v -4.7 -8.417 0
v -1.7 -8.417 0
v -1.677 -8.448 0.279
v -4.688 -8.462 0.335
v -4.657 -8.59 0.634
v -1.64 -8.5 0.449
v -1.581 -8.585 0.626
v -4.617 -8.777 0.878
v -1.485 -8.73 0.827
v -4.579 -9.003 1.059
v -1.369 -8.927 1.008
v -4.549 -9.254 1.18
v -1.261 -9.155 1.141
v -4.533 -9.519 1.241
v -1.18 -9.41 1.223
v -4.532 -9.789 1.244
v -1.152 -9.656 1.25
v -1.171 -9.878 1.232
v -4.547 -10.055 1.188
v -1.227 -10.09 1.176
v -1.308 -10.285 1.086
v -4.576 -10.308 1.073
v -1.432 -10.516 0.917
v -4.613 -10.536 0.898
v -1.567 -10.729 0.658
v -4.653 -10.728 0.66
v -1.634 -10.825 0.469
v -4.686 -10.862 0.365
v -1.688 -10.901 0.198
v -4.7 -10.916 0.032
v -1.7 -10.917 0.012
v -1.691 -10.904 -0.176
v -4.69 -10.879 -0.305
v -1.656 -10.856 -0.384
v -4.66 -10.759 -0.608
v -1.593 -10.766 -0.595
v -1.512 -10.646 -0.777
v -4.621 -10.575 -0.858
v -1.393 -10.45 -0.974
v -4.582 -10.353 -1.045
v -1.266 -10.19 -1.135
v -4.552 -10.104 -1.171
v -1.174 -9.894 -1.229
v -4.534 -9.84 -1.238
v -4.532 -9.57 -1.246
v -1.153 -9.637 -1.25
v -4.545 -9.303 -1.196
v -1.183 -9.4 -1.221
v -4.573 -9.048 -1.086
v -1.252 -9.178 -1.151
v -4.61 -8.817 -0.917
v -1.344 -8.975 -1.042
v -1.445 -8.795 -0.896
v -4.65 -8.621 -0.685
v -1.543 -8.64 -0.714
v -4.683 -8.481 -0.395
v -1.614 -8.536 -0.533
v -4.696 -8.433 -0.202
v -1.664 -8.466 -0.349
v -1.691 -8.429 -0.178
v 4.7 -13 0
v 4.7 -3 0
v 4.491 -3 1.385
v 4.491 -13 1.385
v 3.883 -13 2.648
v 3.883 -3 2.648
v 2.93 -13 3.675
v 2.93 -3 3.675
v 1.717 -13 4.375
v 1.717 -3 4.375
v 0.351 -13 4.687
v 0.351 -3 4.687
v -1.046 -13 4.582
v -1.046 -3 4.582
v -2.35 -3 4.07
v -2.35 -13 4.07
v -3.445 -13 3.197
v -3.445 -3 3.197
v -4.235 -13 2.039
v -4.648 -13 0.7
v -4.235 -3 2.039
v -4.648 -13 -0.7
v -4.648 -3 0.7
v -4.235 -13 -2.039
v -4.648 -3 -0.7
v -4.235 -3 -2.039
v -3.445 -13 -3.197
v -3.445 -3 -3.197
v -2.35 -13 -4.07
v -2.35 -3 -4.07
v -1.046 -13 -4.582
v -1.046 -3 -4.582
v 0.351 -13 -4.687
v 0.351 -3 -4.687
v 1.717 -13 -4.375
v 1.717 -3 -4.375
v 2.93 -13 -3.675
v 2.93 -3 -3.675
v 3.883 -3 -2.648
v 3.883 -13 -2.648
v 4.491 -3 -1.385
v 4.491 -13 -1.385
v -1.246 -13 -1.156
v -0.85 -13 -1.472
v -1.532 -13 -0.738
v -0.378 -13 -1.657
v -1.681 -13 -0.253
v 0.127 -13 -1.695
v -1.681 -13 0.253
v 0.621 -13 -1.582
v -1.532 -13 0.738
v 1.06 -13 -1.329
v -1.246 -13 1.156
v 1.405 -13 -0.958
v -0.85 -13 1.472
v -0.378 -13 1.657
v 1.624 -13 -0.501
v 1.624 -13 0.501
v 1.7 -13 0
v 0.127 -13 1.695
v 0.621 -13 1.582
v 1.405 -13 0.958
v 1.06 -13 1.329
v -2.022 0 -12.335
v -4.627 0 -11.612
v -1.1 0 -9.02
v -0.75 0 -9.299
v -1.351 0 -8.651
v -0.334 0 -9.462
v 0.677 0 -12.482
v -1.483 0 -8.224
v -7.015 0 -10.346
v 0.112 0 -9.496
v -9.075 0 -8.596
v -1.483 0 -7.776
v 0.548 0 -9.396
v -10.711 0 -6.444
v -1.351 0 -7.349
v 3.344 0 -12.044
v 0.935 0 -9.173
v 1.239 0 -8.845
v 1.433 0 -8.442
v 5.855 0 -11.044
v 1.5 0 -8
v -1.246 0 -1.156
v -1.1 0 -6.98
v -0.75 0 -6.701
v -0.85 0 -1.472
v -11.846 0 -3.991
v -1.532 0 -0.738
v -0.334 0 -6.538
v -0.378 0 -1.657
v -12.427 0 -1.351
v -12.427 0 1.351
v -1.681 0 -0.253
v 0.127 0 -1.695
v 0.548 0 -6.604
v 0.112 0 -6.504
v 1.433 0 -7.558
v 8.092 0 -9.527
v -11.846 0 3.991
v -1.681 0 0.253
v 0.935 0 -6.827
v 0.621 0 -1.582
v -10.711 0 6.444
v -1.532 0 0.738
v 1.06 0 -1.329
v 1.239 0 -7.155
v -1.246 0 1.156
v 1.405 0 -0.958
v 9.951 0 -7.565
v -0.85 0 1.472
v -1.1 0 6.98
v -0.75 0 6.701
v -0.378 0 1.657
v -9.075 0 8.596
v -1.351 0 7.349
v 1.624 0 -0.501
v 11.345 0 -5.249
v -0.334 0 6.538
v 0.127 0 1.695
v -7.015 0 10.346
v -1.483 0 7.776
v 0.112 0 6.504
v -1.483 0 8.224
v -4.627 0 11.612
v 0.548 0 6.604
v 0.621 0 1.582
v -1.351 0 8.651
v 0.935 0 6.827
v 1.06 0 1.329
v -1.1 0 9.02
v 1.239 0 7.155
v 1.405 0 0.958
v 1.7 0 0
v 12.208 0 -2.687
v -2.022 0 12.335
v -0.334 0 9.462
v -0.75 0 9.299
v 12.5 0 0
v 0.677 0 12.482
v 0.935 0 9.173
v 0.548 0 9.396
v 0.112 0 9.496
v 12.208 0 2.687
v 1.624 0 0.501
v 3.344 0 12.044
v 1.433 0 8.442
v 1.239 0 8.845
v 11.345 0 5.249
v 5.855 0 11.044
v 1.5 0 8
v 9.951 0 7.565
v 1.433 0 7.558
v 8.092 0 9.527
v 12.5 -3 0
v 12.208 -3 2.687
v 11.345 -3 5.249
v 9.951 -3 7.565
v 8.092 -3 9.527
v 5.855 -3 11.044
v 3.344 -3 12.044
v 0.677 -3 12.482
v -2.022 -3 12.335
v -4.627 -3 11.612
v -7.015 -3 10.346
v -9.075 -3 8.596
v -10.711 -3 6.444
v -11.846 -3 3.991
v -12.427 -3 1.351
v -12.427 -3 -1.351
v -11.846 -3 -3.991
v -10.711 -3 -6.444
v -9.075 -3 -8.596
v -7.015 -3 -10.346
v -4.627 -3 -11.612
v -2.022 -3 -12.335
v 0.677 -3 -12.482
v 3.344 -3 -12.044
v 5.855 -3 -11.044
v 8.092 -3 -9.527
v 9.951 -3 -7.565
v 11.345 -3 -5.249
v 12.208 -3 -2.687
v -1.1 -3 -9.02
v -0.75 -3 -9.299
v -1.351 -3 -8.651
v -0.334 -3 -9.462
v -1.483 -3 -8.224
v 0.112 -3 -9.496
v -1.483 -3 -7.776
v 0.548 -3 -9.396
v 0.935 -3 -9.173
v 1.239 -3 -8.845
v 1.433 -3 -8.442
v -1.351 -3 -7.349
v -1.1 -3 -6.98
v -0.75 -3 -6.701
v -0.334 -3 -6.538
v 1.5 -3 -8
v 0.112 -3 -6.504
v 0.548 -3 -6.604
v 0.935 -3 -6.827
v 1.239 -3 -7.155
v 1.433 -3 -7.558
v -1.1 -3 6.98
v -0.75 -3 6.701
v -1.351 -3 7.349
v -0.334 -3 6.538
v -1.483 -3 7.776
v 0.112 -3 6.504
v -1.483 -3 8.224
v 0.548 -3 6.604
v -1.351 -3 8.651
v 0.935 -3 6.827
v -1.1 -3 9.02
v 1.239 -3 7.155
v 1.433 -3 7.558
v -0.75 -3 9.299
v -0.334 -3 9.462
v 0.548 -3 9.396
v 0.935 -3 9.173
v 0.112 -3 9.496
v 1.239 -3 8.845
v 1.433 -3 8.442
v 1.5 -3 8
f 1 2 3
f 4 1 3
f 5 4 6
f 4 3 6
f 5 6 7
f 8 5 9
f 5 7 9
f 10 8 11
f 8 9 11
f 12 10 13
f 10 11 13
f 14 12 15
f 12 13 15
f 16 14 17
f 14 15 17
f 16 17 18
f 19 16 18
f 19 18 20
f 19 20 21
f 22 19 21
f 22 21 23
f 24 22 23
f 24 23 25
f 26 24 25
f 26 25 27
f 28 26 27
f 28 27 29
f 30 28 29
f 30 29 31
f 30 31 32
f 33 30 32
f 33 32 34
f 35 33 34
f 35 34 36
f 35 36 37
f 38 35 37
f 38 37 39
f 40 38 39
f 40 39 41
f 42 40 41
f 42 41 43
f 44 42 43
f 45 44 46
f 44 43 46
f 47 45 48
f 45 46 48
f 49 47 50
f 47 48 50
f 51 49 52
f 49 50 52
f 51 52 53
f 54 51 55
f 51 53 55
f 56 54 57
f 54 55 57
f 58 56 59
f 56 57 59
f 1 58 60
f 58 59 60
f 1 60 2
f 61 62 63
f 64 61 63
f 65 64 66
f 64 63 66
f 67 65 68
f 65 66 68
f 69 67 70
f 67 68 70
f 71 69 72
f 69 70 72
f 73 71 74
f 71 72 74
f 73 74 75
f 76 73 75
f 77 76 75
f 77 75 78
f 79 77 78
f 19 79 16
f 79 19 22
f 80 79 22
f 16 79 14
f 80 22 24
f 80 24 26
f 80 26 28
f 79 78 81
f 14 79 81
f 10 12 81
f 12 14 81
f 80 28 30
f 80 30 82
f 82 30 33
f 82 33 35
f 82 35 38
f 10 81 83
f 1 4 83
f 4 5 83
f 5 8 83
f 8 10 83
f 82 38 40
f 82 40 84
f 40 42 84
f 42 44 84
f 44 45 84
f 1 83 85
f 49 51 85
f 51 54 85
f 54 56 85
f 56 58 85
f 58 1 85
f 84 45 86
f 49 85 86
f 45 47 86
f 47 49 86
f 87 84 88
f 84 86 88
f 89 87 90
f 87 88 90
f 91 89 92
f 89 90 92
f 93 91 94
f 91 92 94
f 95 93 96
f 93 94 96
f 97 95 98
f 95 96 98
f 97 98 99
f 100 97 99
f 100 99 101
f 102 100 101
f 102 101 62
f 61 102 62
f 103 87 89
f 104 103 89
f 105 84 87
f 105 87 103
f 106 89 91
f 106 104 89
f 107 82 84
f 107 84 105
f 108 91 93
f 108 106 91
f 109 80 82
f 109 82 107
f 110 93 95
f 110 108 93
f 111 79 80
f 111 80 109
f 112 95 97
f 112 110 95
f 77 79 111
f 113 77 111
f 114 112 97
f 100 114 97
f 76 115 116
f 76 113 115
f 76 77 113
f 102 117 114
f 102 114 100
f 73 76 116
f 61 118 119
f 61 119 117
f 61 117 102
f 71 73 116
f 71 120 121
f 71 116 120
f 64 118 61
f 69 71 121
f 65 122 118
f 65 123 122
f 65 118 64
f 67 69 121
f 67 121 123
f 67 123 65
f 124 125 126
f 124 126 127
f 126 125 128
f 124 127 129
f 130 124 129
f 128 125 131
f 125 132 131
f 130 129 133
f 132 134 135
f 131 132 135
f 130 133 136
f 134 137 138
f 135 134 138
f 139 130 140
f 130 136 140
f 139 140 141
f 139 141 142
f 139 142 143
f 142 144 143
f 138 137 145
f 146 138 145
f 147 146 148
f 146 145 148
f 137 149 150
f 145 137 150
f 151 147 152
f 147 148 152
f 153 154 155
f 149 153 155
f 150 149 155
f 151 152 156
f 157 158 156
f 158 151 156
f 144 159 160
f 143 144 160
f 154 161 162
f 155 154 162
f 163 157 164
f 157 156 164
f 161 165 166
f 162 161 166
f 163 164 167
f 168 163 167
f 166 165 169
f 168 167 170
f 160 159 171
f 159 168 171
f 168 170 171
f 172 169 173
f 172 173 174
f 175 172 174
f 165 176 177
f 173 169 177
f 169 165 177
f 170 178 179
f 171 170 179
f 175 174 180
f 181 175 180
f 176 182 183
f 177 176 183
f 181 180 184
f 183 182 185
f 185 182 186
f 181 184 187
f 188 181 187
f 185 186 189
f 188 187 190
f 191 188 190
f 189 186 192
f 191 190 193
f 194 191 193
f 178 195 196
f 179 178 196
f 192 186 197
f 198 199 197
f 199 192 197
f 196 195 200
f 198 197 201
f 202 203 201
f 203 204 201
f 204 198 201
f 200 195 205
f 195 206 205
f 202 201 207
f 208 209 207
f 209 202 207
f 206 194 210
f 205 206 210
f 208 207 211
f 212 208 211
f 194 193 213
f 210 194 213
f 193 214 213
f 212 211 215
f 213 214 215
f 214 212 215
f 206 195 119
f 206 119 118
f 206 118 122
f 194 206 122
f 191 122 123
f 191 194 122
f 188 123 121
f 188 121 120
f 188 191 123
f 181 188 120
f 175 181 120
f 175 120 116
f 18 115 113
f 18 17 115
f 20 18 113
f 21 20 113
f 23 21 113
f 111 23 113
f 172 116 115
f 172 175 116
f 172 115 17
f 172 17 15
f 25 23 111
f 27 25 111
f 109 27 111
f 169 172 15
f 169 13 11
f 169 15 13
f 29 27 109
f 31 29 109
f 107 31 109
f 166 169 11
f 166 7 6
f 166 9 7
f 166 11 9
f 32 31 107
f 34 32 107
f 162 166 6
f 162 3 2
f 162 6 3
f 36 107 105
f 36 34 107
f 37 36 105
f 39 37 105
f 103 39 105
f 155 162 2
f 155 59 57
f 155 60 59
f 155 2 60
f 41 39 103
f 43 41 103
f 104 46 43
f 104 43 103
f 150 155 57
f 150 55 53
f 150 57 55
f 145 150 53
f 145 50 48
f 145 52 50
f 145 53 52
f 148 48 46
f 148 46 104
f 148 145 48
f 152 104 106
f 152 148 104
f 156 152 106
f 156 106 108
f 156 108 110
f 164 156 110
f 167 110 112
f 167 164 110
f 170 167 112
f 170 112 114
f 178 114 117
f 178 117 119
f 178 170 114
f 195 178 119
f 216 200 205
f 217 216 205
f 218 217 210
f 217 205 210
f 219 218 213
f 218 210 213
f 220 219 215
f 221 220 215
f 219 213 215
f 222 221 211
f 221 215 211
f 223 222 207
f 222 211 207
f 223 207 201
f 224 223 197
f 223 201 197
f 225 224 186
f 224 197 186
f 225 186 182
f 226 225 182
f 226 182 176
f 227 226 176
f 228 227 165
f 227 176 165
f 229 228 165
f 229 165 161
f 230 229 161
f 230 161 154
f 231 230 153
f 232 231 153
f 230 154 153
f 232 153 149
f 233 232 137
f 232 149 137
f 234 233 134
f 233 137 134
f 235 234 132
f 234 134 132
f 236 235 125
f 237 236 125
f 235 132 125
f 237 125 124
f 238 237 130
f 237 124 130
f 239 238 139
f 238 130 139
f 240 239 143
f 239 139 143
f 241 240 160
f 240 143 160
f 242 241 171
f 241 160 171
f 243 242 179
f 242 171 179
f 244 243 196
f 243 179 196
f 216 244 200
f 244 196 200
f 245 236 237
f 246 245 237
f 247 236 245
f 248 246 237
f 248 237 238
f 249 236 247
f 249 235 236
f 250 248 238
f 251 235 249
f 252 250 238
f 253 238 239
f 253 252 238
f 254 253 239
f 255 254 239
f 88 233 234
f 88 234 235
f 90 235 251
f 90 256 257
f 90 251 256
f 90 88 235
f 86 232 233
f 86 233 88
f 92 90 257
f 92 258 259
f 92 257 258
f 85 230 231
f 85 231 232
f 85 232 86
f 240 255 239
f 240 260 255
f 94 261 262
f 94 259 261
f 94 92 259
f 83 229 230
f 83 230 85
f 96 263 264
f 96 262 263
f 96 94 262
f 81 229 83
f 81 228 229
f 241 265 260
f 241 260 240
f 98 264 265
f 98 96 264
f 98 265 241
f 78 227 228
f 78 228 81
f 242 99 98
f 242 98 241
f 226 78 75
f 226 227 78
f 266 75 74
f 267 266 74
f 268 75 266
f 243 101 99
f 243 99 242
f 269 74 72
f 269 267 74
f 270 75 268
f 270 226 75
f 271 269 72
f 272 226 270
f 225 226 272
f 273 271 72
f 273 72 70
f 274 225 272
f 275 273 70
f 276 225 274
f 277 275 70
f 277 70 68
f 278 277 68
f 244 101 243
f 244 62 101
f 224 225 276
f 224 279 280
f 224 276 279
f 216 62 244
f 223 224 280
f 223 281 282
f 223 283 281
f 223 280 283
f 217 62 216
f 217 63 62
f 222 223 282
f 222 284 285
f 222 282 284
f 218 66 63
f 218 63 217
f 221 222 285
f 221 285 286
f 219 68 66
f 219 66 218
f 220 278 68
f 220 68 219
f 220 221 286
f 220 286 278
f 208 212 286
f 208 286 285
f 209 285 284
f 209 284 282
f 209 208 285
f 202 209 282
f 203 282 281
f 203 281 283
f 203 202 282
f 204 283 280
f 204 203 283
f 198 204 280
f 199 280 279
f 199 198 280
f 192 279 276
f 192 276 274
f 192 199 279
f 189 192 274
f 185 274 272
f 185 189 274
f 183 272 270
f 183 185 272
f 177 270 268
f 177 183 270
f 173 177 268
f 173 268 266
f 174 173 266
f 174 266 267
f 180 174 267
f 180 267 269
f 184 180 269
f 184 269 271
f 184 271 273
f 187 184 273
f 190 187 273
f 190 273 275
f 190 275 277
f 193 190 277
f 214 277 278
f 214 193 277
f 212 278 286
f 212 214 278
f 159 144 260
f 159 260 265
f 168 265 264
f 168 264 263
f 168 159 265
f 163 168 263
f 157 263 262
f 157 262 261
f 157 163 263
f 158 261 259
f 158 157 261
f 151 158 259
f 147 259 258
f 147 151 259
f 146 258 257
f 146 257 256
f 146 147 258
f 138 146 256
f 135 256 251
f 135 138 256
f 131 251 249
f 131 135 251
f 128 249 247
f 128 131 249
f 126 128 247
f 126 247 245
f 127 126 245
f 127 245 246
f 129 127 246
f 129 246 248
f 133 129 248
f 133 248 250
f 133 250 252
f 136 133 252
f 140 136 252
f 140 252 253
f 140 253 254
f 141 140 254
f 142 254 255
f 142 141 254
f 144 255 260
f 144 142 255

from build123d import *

# Parameters (mm, degrees)
F2_R     = 12.5
F2_R_2   = 1.5
F2_R_3   = 1.7
F3_DEPTH = 3
F4_R     = 4.7
F4_R_2   = 1.7
F5_DEPTH = 10
F6_R     = 1.25
F7_DEPTH = 25


with BuildPart() as f3:
    # F2 (on Front) → F3 (new body)
    with BuildSketch(Plane.XZ):
        Circle(F2_R)
        with Locations((0, -8)):
            Circle(F2_R_2, mode=Mode.SUBTRACT)
        Circle(F2_R_3, mode=Mode.SUBTRACT)
        with Locations((0, 8)):
            Circle(F2_R_2, mode=Mode.SUBTRACT)
    extrude(amount=F3_DEPTH)

    # F4 (on face) → F5 (join)
    with BuildSketch(Plane.XZ.offset(3)):
        Circle(F4_R)
        Circle(F4_R_2, mode=Mode.SUBTRACT)
    extrude(amount=F5_DEPTH)

    # F6 (on Right) → F7 (cut)
    with BuildSketch(Plane.YZ):
        with Locations((-9.6666666667, 0)):
            Circle(F6_R)
    extrude(amount=-F7_DEPTH, mode=Mode.SUBTRACT)


solid = f3.part
